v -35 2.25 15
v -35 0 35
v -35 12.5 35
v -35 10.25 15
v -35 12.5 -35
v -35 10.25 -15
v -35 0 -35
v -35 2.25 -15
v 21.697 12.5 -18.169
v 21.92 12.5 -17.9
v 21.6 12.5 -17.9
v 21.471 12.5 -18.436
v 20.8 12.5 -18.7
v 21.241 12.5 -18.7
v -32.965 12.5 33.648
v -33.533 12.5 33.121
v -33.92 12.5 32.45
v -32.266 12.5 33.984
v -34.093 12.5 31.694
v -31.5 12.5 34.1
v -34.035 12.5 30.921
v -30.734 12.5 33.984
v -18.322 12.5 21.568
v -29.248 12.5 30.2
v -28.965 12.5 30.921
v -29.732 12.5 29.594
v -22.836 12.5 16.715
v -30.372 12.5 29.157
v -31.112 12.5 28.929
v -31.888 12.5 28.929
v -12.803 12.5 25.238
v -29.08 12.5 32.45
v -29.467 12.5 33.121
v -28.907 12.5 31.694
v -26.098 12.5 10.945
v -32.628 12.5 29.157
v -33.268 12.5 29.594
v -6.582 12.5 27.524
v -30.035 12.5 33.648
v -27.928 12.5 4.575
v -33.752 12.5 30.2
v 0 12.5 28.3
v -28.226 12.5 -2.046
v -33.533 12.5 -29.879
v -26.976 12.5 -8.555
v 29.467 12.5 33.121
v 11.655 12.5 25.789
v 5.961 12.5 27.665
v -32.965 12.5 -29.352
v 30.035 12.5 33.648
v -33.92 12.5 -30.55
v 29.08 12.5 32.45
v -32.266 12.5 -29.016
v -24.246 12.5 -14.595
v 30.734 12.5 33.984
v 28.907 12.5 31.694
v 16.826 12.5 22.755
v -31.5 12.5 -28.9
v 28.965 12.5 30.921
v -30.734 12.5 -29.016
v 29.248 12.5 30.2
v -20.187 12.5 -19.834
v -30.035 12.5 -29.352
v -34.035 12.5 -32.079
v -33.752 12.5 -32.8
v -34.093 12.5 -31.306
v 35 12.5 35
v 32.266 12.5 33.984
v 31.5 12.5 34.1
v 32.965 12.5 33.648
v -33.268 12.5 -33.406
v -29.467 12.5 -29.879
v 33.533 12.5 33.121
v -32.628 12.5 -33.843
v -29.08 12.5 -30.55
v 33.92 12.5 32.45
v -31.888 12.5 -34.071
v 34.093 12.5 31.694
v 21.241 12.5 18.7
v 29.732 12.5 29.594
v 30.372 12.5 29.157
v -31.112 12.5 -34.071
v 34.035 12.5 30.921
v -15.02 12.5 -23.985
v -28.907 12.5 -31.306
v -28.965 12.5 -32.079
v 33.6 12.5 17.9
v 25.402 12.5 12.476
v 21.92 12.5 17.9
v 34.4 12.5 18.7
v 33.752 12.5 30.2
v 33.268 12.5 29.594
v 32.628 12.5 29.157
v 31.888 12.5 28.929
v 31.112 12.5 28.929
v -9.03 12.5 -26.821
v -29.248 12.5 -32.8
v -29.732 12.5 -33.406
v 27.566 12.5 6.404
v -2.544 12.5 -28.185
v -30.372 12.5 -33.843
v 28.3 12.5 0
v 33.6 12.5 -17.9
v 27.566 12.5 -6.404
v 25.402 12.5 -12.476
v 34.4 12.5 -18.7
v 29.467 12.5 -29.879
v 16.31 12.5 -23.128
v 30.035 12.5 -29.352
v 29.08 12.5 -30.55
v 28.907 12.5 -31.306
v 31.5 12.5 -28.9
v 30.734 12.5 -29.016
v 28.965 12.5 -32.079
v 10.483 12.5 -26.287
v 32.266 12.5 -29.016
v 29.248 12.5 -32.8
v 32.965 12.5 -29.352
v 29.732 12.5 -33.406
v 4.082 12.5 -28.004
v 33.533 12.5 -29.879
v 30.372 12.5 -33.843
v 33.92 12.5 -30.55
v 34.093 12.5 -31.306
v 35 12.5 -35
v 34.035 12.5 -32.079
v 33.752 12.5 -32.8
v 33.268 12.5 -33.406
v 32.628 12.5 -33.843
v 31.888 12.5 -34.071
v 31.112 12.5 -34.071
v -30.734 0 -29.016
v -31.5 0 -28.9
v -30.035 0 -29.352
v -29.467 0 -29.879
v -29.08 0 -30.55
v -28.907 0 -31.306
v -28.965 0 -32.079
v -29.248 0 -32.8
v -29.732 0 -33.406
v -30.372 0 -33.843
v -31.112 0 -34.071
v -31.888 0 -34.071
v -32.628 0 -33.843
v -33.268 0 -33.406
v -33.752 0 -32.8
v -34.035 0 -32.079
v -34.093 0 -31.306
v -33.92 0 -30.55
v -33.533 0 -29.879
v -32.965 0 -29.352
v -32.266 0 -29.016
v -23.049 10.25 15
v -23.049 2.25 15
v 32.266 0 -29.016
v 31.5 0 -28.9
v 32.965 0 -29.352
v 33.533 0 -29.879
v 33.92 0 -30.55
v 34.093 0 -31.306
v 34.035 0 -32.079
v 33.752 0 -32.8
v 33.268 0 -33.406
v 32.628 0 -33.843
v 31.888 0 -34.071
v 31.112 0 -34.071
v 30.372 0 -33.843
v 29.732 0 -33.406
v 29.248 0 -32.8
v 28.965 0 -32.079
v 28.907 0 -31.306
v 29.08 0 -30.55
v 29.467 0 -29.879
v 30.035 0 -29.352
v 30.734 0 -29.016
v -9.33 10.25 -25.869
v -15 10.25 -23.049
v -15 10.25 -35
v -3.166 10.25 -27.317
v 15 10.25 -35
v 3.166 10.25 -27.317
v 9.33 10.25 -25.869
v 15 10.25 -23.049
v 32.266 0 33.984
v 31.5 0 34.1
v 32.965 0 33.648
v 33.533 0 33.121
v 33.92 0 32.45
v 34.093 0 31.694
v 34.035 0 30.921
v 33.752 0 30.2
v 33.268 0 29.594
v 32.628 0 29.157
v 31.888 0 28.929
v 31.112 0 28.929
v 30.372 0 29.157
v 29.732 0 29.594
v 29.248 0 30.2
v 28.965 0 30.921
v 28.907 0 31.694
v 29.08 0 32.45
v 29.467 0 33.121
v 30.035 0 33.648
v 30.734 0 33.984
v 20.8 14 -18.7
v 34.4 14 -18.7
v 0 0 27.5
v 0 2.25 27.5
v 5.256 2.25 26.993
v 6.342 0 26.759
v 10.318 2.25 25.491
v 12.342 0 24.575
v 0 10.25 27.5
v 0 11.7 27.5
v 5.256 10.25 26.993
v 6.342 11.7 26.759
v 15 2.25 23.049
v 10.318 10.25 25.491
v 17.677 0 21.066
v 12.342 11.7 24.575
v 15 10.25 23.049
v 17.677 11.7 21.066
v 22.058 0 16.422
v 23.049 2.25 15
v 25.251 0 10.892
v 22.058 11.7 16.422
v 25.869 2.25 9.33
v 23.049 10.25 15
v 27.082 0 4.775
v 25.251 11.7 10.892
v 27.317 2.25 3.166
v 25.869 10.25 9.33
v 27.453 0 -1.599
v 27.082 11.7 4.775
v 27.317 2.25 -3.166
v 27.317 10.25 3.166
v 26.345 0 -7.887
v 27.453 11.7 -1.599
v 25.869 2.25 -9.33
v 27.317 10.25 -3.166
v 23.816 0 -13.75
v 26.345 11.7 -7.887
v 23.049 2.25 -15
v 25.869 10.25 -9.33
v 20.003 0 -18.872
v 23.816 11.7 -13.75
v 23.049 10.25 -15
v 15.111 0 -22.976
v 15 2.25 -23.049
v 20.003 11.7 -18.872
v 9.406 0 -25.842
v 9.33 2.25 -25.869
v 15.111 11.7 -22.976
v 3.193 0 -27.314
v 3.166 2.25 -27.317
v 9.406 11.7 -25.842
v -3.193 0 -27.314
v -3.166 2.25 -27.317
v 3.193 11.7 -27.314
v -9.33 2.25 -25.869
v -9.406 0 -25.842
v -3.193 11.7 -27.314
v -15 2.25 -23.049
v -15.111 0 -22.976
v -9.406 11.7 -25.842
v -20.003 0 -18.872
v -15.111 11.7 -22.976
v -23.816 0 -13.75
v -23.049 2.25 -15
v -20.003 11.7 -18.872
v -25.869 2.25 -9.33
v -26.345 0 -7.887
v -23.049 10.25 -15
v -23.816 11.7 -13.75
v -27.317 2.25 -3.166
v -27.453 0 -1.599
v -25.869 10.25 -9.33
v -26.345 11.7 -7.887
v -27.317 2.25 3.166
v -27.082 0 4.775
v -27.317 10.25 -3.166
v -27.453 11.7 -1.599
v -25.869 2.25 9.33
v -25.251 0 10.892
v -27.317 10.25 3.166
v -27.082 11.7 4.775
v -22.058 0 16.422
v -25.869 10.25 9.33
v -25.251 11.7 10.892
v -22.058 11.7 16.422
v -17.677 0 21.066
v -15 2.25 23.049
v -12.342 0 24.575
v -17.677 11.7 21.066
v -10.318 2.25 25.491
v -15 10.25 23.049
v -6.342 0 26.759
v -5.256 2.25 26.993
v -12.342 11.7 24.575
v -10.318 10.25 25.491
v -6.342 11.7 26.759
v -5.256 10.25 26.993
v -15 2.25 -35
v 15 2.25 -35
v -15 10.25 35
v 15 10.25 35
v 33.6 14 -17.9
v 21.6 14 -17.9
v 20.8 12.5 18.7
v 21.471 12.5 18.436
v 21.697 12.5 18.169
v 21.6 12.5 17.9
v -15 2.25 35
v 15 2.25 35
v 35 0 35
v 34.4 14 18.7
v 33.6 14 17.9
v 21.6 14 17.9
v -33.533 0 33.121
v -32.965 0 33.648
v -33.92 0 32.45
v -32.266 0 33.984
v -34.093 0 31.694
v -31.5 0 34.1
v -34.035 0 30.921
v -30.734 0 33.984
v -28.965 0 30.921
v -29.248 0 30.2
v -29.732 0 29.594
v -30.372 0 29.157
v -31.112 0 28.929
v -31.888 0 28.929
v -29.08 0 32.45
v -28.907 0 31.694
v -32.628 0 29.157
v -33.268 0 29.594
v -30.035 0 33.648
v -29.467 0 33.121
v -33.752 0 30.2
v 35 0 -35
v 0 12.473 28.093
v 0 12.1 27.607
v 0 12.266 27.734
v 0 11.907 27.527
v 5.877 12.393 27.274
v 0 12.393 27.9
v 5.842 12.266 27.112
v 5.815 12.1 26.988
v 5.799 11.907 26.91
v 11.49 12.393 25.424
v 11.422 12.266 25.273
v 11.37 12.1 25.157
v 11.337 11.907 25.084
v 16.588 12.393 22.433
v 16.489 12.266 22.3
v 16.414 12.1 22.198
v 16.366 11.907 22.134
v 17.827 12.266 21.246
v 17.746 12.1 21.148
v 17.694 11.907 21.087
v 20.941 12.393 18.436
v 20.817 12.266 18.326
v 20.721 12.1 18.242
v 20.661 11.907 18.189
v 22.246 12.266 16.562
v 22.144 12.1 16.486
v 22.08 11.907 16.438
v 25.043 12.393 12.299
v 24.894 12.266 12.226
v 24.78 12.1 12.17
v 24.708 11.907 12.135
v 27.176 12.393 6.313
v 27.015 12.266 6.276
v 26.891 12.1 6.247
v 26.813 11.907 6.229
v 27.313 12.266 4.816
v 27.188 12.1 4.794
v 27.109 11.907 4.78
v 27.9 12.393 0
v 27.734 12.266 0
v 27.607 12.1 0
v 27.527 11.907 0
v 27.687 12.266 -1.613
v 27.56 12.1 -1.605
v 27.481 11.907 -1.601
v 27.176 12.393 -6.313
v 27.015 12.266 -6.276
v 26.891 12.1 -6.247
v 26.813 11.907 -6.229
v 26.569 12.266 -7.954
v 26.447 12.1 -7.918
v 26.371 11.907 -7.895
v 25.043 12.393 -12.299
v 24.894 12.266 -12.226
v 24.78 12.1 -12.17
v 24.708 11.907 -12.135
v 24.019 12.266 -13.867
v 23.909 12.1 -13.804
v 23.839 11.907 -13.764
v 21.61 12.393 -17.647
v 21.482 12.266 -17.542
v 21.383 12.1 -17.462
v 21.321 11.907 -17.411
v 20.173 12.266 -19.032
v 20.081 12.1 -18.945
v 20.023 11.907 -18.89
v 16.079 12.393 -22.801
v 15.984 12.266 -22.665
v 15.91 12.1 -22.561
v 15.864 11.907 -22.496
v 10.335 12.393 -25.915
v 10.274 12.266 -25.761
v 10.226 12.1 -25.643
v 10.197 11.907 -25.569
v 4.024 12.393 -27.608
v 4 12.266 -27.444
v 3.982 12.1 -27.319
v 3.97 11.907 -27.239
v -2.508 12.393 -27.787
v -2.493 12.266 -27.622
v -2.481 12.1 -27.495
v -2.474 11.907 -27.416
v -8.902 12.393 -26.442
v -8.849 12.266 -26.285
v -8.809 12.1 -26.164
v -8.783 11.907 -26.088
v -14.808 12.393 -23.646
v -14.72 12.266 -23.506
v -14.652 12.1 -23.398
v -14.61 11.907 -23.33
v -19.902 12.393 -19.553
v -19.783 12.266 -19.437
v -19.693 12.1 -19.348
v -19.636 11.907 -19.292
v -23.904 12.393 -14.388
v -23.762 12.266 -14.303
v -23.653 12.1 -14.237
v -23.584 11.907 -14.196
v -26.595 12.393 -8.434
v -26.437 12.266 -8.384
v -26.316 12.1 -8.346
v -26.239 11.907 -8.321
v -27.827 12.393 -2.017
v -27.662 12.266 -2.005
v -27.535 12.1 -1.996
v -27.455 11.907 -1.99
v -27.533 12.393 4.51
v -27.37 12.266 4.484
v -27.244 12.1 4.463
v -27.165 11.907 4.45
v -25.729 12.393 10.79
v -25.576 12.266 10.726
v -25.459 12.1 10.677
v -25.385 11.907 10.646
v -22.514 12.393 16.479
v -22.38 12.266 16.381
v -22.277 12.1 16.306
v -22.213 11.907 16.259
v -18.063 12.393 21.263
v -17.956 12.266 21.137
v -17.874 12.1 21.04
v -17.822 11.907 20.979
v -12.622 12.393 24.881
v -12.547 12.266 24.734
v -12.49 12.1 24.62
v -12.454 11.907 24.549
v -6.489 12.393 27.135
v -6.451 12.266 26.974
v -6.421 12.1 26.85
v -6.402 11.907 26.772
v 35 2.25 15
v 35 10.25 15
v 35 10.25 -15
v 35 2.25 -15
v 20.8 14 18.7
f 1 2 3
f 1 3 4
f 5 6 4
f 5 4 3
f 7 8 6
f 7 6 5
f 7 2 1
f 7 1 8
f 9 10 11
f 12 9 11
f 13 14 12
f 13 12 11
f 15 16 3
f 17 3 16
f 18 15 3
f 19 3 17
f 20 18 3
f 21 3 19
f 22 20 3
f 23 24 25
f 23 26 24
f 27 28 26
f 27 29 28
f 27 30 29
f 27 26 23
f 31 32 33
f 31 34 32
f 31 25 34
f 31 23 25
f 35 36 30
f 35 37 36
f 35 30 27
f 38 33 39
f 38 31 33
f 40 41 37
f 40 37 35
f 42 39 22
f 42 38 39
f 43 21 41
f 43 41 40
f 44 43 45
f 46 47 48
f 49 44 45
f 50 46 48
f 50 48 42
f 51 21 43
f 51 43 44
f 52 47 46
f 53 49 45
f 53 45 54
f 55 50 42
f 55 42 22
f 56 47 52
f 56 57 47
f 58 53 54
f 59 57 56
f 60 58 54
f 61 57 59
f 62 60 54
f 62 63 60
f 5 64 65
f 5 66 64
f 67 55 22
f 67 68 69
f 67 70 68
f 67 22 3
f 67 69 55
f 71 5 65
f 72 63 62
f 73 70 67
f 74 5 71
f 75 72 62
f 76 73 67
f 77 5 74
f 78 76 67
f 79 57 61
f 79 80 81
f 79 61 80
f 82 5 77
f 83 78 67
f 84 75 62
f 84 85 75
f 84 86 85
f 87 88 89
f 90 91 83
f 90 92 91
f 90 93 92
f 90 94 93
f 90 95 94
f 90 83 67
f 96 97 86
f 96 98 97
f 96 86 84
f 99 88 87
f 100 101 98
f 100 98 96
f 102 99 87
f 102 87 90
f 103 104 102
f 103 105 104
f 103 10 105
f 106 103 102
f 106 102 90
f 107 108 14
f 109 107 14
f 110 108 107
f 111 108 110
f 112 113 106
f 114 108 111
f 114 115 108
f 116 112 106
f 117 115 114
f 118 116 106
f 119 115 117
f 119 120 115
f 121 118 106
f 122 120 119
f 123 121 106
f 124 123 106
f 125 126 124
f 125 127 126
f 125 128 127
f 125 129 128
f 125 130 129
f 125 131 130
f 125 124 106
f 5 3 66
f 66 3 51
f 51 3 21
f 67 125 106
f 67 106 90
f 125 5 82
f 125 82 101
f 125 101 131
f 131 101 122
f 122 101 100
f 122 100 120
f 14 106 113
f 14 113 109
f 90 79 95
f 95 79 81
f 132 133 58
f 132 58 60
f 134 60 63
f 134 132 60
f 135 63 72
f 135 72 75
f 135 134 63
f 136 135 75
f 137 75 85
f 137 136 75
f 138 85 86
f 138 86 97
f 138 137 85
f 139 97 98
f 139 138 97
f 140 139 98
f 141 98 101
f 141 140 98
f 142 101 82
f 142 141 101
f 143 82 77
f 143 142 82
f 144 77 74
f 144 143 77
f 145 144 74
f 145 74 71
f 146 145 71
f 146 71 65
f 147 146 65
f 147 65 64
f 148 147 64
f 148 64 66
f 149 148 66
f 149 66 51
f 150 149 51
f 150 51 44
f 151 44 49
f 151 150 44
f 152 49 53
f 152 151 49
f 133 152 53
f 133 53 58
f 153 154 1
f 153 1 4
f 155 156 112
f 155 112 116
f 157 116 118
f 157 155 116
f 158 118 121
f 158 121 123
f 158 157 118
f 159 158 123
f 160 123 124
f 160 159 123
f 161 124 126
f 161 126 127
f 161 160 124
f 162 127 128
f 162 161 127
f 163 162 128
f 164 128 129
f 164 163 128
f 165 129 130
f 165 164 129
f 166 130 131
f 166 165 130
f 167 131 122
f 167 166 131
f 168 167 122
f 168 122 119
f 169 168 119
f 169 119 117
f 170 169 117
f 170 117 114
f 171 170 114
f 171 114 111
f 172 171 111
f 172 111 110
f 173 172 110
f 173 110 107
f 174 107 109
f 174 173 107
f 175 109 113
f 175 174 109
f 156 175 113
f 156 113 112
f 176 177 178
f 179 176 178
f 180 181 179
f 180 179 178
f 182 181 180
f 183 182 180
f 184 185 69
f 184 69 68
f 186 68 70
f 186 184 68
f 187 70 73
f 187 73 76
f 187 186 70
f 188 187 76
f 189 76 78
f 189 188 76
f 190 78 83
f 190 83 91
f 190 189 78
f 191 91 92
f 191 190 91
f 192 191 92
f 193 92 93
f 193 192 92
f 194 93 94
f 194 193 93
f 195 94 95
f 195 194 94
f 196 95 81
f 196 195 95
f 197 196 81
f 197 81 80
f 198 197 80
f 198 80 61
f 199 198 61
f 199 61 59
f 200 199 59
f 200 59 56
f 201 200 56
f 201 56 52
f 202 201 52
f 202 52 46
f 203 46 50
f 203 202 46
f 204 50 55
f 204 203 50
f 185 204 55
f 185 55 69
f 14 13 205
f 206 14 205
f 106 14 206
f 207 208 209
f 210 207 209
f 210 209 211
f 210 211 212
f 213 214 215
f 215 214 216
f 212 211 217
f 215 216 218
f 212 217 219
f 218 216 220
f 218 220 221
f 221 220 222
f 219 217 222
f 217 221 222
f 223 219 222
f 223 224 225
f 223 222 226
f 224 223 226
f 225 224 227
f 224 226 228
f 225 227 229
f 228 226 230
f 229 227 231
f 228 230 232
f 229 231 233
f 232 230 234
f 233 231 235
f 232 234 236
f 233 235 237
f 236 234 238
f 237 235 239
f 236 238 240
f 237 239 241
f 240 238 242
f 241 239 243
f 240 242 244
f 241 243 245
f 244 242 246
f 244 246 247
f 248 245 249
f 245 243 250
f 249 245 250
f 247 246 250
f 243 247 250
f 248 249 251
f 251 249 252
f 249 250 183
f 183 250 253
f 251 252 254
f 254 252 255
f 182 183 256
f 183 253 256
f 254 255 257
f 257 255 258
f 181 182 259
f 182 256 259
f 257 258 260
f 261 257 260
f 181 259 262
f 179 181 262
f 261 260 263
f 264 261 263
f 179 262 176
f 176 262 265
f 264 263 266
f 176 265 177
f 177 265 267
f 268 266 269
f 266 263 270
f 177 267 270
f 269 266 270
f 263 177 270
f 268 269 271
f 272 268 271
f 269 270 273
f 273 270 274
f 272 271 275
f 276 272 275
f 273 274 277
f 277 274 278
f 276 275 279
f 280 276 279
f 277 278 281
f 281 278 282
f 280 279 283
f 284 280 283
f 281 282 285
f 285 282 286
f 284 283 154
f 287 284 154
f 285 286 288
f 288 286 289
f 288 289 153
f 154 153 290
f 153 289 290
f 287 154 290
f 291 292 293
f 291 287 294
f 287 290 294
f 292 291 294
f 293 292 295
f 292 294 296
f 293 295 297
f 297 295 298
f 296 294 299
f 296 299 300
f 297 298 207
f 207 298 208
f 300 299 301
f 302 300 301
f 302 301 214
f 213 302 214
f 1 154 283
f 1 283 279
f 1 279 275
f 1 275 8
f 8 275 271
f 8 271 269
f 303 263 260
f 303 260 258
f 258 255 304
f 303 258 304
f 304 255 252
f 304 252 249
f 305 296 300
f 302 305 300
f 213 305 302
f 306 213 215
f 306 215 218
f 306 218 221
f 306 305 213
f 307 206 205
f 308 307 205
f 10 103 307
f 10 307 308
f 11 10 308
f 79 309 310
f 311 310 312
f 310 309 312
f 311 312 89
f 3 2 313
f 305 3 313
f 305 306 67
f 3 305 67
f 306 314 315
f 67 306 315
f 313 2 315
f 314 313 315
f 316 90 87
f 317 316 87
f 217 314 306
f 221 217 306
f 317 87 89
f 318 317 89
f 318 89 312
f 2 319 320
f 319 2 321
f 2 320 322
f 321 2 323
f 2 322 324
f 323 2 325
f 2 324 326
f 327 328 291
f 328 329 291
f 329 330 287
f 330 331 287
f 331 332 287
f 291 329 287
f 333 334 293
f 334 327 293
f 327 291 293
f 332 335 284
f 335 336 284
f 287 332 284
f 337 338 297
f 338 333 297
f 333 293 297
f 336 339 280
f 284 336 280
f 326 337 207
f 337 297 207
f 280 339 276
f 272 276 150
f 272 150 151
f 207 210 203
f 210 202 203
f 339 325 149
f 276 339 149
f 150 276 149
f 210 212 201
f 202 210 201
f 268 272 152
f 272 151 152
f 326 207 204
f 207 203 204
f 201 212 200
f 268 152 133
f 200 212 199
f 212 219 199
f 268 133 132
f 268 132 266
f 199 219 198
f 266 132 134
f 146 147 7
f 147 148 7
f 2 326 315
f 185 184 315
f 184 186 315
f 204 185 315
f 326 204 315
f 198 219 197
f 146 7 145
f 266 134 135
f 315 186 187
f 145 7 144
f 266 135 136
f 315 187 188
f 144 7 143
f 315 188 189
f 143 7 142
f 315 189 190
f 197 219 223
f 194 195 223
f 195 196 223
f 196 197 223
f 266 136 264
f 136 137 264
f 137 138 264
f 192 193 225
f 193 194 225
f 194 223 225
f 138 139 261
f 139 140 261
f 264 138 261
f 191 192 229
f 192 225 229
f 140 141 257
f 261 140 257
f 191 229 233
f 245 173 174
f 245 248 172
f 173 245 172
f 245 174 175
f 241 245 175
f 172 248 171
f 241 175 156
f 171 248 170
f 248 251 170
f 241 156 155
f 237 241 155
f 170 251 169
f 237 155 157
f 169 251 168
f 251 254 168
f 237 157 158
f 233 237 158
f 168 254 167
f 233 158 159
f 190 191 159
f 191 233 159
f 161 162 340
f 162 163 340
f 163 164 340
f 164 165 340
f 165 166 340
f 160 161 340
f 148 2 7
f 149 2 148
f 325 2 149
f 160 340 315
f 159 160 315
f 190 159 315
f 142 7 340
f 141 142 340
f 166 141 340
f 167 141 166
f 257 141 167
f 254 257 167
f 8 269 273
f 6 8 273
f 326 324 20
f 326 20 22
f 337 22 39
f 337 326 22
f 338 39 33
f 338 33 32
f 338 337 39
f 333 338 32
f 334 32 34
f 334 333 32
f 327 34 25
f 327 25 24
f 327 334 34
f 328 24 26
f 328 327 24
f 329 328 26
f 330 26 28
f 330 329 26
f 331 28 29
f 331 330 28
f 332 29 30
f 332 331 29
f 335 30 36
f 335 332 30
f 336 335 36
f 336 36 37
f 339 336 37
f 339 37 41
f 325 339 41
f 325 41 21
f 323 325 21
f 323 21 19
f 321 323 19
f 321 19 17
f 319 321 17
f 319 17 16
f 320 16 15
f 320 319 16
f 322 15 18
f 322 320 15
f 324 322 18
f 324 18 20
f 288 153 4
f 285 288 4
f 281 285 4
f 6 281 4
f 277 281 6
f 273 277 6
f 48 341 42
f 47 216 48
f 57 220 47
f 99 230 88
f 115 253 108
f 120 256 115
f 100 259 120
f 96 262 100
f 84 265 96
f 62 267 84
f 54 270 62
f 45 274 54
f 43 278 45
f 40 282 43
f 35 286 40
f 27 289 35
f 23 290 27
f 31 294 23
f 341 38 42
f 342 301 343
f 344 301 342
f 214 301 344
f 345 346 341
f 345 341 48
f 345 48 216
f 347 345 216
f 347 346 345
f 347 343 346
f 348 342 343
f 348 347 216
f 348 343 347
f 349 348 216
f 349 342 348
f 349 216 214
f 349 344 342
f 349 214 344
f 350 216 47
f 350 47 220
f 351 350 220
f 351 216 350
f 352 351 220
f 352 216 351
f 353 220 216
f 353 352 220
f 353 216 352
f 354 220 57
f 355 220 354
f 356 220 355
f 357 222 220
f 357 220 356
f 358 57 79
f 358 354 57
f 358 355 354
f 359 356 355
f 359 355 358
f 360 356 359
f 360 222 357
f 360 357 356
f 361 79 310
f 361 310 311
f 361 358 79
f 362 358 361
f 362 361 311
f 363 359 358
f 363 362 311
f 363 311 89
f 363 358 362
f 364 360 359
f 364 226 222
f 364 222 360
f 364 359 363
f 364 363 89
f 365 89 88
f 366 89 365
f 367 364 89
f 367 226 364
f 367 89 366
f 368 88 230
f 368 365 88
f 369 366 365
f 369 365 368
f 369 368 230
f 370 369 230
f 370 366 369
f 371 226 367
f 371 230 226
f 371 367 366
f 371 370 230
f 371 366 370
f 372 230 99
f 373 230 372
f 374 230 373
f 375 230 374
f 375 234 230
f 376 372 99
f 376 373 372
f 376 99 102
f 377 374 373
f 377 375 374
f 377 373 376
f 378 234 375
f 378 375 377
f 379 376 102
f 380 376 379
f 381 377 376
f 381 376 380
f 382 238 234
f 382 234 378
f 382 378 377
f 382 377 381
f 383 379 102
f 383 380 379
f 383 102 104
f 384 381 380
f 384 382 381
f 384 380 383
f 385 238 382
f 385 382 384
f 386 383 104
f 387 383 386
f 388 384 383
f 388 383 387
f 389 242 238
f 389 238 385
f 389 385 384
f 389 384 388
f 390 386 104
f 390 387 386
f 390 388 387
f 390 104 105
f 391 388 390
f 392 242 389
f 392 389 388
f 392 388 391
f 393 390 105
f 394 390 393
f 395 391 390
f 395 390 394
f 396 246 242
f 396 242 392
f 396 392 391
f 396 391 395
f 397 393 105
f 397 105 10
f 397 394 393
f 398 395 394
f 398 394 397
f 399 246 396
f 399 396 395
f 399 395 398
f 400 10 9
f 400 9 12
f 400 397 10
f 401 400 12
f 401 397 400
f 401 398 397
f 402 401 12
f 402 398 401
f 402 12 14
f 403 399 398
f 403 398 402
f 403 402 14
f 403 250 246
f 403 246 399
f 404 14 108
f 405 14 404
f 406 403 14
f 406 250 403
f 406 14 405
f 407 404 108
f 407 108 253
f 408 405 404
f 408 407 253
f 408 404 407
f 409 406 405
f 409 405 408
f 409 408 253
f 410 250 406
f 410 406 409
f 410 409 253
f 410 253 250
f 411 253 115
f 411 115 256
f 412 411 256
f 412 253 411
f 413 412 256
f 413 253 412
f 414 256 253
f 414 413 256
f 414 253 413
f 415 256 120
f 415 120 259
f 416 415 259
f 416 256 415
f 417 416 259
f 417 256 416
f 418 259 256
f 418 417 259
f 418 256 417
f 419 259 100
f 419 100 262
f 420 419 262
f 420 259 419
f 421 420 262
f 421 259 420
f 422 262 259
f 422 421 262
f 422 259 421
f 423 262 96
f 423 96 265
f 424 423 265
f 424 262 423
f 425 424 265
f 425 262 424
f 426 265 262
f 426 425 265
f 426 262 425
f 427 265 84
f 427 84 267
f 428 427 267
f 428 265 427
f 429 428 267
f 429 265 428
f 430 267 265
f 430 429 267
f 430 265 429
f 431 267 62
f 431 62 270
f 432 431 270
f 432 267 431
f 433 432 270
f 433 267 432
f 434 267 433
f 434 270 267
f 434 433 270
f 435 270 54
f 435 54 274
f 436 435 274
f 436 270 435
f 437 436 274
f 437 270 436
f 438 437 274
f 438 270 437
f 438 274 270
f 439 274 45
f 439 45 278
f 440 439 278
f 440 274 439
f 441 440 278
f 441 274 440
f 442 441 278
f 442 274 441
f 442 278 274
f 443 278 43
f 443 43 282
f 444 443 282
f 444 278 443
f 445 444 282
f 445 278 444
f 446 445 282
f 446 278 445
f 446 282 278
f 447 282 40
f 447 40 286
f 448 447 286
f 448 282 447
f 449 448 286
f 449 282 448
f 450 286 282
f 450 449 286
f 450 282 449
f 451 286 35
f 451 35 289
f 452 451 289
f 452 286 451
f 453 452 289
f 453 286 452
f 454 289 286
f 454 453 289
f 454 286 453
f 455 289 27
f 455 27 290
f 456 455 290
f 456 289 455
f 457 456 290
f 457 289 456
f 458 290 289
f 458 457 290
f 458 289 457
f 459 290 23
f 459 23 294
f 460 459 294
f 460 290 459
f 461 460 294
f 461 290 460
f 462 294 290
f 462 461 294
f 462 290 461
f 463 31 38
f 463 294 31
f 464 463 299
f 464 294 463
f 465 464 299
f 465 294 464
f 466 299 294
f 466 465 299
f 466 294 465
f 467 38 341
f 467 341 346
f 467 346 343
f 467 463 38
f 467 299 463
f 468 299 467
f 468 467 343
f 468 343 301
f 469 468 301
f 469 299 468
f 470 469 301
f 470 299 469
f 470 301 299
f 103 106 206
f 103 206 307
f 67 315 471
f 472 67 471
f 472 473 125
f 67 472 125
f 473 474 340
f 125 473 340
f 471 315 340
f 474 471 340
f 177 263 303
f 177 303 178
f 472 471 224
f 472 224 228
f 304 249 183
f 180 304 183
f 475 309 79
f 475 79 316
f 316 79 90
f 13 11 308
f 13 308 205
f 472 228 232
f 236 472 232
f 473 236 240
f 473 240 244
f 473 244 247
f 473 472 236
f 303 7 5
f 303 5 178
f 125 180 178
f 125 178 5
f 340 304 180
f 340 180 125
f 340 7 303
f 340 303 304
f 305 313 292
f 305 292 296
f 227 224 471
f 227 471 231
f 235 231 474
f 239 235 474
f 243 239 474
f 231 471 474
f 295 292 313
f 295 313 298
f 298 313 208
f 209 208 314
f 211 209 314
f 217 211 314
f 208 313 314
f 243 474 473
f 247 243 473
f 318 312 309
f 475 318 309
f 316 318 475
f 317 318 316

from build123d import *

# Parameters (mm, degrees)
SKETCH1_W           = 70
SKETCH1_H           = 70
SKETCH1_R           = 2.6
BOSS_EXTRUDE1_DEPTH = 12.5
SKETCH2_R           = 27.5
CUT_EXTRUDE1_DEPTH  = 14
FILLET1_R           = 0.8
BOSS_EXTRUDE2_DEPTH = 1.5
SKETCH5_W           = 30
SKETCH5_H           = 8
CUT_EXTRUDE2_DEPTH  = 80.504716841
SKETCH6_W           = 30
SKETCH6_H           = 8
CUT_EXTRUDE3_DEPTH  = 80.504716841


with BuildPart() as part:
    # Sketch1 → Boss-Extrude1 (new body)
    with BuildSketch(Plane(origin=(0, 0, 0), x_dir=(1, 0, 0), z_dir=(0, 1, 0))):
        Rectangle(SKETCH1_W, SKETCH1_H)
        with Locations(Location((31.5, 31.5, 0), (0, 0, 270))):
            Circle(SKETCH1_R, mode=Mode.SUBTRACT)
        with Locations(Location((-31.5, 31.5, 0), (0, 0, 270))):
            Circle(SKETCH1_R, mode=Mode.SUBTRACT)
        with Locations(Location((31.5, -31.5, 0), (0, 0, 270))):
            Circle(SKETCH1_R, mode=Mode.SUBTRACT)
        with Locations(Location((-31.5, -31.5, 0), (0, 0, 270))):
            Circle(SKETCH1_R, mode=Mode.SUBTRACT)
    extrude(amount=BOSS_EXTRUDE1_DEPTH)

    # Sketch2 → Cut-Extrude1 (cut)
    with BuildSketch(Plane(origin=(0, 12.5, 0), x_dir=(1, 0, 0), z_dir=(0, 1, 0))):
        with Locations(Location((0, 0, 0), (0, 0, 270))):
            Circle(SKETCH2_R)
    extrude(amount=-CUT_EXTRUDE1_DEPTH, mode=Mode.SUBTRACT)

    # Fillet1
    fillet1_edges = [part.edges().sort_by_distance(p)[0] for p in [
        (0, 12.5, -27.5),
    ]]
    fillet(fillet1_edges, radius=FILLET1_R)

    # Sketch3 → Boss-Extrude2 (add)
    with BuildSketch(Plane(origin=(0, 12.5, 0), x_dir=(1, 0, 0), z_dir=(0, 1, 0))):
        Polygon((33.6, 17.9), (21.6, 17.9), (20.8, 18.7), (34.4, 18.7), align=None)
        Polygon((33.6, -17.9), (21.6, -17.9), (20.8, -18.7), (34.4, -18.7), align=None)
    extrude(amount=BOSS_EXTRUDE2_DEPTH)

    # Sketch5 → Cut-Extrude2 (cut, through all)
    with BuildSketch(Plane.XY.offset(35)):
        with Locations((0, 6.25)):
            Rectangle(SKETCH5_W, SKETCH5_H)
    extrude(amount=-CUT_EXTRUDE2_DEPTH, mode=Mode.SUBTRACT)

    # Sketch6 → Cut-Extrude3 (cut, through all)
    with BuildSketch(Plane(origin=(35, 0, 0), x_dir=(0, 0, -1), z_dir=(1, 0, 0))):
        with Locations((0, 6.25)):
            Rectangle(SKETCH6_W, SKETCH6_H)
    extrude(amount=-CUT_EXTRUDE3_DEPTH, mode=Mode.SUBTRACT)


solid = part.part
